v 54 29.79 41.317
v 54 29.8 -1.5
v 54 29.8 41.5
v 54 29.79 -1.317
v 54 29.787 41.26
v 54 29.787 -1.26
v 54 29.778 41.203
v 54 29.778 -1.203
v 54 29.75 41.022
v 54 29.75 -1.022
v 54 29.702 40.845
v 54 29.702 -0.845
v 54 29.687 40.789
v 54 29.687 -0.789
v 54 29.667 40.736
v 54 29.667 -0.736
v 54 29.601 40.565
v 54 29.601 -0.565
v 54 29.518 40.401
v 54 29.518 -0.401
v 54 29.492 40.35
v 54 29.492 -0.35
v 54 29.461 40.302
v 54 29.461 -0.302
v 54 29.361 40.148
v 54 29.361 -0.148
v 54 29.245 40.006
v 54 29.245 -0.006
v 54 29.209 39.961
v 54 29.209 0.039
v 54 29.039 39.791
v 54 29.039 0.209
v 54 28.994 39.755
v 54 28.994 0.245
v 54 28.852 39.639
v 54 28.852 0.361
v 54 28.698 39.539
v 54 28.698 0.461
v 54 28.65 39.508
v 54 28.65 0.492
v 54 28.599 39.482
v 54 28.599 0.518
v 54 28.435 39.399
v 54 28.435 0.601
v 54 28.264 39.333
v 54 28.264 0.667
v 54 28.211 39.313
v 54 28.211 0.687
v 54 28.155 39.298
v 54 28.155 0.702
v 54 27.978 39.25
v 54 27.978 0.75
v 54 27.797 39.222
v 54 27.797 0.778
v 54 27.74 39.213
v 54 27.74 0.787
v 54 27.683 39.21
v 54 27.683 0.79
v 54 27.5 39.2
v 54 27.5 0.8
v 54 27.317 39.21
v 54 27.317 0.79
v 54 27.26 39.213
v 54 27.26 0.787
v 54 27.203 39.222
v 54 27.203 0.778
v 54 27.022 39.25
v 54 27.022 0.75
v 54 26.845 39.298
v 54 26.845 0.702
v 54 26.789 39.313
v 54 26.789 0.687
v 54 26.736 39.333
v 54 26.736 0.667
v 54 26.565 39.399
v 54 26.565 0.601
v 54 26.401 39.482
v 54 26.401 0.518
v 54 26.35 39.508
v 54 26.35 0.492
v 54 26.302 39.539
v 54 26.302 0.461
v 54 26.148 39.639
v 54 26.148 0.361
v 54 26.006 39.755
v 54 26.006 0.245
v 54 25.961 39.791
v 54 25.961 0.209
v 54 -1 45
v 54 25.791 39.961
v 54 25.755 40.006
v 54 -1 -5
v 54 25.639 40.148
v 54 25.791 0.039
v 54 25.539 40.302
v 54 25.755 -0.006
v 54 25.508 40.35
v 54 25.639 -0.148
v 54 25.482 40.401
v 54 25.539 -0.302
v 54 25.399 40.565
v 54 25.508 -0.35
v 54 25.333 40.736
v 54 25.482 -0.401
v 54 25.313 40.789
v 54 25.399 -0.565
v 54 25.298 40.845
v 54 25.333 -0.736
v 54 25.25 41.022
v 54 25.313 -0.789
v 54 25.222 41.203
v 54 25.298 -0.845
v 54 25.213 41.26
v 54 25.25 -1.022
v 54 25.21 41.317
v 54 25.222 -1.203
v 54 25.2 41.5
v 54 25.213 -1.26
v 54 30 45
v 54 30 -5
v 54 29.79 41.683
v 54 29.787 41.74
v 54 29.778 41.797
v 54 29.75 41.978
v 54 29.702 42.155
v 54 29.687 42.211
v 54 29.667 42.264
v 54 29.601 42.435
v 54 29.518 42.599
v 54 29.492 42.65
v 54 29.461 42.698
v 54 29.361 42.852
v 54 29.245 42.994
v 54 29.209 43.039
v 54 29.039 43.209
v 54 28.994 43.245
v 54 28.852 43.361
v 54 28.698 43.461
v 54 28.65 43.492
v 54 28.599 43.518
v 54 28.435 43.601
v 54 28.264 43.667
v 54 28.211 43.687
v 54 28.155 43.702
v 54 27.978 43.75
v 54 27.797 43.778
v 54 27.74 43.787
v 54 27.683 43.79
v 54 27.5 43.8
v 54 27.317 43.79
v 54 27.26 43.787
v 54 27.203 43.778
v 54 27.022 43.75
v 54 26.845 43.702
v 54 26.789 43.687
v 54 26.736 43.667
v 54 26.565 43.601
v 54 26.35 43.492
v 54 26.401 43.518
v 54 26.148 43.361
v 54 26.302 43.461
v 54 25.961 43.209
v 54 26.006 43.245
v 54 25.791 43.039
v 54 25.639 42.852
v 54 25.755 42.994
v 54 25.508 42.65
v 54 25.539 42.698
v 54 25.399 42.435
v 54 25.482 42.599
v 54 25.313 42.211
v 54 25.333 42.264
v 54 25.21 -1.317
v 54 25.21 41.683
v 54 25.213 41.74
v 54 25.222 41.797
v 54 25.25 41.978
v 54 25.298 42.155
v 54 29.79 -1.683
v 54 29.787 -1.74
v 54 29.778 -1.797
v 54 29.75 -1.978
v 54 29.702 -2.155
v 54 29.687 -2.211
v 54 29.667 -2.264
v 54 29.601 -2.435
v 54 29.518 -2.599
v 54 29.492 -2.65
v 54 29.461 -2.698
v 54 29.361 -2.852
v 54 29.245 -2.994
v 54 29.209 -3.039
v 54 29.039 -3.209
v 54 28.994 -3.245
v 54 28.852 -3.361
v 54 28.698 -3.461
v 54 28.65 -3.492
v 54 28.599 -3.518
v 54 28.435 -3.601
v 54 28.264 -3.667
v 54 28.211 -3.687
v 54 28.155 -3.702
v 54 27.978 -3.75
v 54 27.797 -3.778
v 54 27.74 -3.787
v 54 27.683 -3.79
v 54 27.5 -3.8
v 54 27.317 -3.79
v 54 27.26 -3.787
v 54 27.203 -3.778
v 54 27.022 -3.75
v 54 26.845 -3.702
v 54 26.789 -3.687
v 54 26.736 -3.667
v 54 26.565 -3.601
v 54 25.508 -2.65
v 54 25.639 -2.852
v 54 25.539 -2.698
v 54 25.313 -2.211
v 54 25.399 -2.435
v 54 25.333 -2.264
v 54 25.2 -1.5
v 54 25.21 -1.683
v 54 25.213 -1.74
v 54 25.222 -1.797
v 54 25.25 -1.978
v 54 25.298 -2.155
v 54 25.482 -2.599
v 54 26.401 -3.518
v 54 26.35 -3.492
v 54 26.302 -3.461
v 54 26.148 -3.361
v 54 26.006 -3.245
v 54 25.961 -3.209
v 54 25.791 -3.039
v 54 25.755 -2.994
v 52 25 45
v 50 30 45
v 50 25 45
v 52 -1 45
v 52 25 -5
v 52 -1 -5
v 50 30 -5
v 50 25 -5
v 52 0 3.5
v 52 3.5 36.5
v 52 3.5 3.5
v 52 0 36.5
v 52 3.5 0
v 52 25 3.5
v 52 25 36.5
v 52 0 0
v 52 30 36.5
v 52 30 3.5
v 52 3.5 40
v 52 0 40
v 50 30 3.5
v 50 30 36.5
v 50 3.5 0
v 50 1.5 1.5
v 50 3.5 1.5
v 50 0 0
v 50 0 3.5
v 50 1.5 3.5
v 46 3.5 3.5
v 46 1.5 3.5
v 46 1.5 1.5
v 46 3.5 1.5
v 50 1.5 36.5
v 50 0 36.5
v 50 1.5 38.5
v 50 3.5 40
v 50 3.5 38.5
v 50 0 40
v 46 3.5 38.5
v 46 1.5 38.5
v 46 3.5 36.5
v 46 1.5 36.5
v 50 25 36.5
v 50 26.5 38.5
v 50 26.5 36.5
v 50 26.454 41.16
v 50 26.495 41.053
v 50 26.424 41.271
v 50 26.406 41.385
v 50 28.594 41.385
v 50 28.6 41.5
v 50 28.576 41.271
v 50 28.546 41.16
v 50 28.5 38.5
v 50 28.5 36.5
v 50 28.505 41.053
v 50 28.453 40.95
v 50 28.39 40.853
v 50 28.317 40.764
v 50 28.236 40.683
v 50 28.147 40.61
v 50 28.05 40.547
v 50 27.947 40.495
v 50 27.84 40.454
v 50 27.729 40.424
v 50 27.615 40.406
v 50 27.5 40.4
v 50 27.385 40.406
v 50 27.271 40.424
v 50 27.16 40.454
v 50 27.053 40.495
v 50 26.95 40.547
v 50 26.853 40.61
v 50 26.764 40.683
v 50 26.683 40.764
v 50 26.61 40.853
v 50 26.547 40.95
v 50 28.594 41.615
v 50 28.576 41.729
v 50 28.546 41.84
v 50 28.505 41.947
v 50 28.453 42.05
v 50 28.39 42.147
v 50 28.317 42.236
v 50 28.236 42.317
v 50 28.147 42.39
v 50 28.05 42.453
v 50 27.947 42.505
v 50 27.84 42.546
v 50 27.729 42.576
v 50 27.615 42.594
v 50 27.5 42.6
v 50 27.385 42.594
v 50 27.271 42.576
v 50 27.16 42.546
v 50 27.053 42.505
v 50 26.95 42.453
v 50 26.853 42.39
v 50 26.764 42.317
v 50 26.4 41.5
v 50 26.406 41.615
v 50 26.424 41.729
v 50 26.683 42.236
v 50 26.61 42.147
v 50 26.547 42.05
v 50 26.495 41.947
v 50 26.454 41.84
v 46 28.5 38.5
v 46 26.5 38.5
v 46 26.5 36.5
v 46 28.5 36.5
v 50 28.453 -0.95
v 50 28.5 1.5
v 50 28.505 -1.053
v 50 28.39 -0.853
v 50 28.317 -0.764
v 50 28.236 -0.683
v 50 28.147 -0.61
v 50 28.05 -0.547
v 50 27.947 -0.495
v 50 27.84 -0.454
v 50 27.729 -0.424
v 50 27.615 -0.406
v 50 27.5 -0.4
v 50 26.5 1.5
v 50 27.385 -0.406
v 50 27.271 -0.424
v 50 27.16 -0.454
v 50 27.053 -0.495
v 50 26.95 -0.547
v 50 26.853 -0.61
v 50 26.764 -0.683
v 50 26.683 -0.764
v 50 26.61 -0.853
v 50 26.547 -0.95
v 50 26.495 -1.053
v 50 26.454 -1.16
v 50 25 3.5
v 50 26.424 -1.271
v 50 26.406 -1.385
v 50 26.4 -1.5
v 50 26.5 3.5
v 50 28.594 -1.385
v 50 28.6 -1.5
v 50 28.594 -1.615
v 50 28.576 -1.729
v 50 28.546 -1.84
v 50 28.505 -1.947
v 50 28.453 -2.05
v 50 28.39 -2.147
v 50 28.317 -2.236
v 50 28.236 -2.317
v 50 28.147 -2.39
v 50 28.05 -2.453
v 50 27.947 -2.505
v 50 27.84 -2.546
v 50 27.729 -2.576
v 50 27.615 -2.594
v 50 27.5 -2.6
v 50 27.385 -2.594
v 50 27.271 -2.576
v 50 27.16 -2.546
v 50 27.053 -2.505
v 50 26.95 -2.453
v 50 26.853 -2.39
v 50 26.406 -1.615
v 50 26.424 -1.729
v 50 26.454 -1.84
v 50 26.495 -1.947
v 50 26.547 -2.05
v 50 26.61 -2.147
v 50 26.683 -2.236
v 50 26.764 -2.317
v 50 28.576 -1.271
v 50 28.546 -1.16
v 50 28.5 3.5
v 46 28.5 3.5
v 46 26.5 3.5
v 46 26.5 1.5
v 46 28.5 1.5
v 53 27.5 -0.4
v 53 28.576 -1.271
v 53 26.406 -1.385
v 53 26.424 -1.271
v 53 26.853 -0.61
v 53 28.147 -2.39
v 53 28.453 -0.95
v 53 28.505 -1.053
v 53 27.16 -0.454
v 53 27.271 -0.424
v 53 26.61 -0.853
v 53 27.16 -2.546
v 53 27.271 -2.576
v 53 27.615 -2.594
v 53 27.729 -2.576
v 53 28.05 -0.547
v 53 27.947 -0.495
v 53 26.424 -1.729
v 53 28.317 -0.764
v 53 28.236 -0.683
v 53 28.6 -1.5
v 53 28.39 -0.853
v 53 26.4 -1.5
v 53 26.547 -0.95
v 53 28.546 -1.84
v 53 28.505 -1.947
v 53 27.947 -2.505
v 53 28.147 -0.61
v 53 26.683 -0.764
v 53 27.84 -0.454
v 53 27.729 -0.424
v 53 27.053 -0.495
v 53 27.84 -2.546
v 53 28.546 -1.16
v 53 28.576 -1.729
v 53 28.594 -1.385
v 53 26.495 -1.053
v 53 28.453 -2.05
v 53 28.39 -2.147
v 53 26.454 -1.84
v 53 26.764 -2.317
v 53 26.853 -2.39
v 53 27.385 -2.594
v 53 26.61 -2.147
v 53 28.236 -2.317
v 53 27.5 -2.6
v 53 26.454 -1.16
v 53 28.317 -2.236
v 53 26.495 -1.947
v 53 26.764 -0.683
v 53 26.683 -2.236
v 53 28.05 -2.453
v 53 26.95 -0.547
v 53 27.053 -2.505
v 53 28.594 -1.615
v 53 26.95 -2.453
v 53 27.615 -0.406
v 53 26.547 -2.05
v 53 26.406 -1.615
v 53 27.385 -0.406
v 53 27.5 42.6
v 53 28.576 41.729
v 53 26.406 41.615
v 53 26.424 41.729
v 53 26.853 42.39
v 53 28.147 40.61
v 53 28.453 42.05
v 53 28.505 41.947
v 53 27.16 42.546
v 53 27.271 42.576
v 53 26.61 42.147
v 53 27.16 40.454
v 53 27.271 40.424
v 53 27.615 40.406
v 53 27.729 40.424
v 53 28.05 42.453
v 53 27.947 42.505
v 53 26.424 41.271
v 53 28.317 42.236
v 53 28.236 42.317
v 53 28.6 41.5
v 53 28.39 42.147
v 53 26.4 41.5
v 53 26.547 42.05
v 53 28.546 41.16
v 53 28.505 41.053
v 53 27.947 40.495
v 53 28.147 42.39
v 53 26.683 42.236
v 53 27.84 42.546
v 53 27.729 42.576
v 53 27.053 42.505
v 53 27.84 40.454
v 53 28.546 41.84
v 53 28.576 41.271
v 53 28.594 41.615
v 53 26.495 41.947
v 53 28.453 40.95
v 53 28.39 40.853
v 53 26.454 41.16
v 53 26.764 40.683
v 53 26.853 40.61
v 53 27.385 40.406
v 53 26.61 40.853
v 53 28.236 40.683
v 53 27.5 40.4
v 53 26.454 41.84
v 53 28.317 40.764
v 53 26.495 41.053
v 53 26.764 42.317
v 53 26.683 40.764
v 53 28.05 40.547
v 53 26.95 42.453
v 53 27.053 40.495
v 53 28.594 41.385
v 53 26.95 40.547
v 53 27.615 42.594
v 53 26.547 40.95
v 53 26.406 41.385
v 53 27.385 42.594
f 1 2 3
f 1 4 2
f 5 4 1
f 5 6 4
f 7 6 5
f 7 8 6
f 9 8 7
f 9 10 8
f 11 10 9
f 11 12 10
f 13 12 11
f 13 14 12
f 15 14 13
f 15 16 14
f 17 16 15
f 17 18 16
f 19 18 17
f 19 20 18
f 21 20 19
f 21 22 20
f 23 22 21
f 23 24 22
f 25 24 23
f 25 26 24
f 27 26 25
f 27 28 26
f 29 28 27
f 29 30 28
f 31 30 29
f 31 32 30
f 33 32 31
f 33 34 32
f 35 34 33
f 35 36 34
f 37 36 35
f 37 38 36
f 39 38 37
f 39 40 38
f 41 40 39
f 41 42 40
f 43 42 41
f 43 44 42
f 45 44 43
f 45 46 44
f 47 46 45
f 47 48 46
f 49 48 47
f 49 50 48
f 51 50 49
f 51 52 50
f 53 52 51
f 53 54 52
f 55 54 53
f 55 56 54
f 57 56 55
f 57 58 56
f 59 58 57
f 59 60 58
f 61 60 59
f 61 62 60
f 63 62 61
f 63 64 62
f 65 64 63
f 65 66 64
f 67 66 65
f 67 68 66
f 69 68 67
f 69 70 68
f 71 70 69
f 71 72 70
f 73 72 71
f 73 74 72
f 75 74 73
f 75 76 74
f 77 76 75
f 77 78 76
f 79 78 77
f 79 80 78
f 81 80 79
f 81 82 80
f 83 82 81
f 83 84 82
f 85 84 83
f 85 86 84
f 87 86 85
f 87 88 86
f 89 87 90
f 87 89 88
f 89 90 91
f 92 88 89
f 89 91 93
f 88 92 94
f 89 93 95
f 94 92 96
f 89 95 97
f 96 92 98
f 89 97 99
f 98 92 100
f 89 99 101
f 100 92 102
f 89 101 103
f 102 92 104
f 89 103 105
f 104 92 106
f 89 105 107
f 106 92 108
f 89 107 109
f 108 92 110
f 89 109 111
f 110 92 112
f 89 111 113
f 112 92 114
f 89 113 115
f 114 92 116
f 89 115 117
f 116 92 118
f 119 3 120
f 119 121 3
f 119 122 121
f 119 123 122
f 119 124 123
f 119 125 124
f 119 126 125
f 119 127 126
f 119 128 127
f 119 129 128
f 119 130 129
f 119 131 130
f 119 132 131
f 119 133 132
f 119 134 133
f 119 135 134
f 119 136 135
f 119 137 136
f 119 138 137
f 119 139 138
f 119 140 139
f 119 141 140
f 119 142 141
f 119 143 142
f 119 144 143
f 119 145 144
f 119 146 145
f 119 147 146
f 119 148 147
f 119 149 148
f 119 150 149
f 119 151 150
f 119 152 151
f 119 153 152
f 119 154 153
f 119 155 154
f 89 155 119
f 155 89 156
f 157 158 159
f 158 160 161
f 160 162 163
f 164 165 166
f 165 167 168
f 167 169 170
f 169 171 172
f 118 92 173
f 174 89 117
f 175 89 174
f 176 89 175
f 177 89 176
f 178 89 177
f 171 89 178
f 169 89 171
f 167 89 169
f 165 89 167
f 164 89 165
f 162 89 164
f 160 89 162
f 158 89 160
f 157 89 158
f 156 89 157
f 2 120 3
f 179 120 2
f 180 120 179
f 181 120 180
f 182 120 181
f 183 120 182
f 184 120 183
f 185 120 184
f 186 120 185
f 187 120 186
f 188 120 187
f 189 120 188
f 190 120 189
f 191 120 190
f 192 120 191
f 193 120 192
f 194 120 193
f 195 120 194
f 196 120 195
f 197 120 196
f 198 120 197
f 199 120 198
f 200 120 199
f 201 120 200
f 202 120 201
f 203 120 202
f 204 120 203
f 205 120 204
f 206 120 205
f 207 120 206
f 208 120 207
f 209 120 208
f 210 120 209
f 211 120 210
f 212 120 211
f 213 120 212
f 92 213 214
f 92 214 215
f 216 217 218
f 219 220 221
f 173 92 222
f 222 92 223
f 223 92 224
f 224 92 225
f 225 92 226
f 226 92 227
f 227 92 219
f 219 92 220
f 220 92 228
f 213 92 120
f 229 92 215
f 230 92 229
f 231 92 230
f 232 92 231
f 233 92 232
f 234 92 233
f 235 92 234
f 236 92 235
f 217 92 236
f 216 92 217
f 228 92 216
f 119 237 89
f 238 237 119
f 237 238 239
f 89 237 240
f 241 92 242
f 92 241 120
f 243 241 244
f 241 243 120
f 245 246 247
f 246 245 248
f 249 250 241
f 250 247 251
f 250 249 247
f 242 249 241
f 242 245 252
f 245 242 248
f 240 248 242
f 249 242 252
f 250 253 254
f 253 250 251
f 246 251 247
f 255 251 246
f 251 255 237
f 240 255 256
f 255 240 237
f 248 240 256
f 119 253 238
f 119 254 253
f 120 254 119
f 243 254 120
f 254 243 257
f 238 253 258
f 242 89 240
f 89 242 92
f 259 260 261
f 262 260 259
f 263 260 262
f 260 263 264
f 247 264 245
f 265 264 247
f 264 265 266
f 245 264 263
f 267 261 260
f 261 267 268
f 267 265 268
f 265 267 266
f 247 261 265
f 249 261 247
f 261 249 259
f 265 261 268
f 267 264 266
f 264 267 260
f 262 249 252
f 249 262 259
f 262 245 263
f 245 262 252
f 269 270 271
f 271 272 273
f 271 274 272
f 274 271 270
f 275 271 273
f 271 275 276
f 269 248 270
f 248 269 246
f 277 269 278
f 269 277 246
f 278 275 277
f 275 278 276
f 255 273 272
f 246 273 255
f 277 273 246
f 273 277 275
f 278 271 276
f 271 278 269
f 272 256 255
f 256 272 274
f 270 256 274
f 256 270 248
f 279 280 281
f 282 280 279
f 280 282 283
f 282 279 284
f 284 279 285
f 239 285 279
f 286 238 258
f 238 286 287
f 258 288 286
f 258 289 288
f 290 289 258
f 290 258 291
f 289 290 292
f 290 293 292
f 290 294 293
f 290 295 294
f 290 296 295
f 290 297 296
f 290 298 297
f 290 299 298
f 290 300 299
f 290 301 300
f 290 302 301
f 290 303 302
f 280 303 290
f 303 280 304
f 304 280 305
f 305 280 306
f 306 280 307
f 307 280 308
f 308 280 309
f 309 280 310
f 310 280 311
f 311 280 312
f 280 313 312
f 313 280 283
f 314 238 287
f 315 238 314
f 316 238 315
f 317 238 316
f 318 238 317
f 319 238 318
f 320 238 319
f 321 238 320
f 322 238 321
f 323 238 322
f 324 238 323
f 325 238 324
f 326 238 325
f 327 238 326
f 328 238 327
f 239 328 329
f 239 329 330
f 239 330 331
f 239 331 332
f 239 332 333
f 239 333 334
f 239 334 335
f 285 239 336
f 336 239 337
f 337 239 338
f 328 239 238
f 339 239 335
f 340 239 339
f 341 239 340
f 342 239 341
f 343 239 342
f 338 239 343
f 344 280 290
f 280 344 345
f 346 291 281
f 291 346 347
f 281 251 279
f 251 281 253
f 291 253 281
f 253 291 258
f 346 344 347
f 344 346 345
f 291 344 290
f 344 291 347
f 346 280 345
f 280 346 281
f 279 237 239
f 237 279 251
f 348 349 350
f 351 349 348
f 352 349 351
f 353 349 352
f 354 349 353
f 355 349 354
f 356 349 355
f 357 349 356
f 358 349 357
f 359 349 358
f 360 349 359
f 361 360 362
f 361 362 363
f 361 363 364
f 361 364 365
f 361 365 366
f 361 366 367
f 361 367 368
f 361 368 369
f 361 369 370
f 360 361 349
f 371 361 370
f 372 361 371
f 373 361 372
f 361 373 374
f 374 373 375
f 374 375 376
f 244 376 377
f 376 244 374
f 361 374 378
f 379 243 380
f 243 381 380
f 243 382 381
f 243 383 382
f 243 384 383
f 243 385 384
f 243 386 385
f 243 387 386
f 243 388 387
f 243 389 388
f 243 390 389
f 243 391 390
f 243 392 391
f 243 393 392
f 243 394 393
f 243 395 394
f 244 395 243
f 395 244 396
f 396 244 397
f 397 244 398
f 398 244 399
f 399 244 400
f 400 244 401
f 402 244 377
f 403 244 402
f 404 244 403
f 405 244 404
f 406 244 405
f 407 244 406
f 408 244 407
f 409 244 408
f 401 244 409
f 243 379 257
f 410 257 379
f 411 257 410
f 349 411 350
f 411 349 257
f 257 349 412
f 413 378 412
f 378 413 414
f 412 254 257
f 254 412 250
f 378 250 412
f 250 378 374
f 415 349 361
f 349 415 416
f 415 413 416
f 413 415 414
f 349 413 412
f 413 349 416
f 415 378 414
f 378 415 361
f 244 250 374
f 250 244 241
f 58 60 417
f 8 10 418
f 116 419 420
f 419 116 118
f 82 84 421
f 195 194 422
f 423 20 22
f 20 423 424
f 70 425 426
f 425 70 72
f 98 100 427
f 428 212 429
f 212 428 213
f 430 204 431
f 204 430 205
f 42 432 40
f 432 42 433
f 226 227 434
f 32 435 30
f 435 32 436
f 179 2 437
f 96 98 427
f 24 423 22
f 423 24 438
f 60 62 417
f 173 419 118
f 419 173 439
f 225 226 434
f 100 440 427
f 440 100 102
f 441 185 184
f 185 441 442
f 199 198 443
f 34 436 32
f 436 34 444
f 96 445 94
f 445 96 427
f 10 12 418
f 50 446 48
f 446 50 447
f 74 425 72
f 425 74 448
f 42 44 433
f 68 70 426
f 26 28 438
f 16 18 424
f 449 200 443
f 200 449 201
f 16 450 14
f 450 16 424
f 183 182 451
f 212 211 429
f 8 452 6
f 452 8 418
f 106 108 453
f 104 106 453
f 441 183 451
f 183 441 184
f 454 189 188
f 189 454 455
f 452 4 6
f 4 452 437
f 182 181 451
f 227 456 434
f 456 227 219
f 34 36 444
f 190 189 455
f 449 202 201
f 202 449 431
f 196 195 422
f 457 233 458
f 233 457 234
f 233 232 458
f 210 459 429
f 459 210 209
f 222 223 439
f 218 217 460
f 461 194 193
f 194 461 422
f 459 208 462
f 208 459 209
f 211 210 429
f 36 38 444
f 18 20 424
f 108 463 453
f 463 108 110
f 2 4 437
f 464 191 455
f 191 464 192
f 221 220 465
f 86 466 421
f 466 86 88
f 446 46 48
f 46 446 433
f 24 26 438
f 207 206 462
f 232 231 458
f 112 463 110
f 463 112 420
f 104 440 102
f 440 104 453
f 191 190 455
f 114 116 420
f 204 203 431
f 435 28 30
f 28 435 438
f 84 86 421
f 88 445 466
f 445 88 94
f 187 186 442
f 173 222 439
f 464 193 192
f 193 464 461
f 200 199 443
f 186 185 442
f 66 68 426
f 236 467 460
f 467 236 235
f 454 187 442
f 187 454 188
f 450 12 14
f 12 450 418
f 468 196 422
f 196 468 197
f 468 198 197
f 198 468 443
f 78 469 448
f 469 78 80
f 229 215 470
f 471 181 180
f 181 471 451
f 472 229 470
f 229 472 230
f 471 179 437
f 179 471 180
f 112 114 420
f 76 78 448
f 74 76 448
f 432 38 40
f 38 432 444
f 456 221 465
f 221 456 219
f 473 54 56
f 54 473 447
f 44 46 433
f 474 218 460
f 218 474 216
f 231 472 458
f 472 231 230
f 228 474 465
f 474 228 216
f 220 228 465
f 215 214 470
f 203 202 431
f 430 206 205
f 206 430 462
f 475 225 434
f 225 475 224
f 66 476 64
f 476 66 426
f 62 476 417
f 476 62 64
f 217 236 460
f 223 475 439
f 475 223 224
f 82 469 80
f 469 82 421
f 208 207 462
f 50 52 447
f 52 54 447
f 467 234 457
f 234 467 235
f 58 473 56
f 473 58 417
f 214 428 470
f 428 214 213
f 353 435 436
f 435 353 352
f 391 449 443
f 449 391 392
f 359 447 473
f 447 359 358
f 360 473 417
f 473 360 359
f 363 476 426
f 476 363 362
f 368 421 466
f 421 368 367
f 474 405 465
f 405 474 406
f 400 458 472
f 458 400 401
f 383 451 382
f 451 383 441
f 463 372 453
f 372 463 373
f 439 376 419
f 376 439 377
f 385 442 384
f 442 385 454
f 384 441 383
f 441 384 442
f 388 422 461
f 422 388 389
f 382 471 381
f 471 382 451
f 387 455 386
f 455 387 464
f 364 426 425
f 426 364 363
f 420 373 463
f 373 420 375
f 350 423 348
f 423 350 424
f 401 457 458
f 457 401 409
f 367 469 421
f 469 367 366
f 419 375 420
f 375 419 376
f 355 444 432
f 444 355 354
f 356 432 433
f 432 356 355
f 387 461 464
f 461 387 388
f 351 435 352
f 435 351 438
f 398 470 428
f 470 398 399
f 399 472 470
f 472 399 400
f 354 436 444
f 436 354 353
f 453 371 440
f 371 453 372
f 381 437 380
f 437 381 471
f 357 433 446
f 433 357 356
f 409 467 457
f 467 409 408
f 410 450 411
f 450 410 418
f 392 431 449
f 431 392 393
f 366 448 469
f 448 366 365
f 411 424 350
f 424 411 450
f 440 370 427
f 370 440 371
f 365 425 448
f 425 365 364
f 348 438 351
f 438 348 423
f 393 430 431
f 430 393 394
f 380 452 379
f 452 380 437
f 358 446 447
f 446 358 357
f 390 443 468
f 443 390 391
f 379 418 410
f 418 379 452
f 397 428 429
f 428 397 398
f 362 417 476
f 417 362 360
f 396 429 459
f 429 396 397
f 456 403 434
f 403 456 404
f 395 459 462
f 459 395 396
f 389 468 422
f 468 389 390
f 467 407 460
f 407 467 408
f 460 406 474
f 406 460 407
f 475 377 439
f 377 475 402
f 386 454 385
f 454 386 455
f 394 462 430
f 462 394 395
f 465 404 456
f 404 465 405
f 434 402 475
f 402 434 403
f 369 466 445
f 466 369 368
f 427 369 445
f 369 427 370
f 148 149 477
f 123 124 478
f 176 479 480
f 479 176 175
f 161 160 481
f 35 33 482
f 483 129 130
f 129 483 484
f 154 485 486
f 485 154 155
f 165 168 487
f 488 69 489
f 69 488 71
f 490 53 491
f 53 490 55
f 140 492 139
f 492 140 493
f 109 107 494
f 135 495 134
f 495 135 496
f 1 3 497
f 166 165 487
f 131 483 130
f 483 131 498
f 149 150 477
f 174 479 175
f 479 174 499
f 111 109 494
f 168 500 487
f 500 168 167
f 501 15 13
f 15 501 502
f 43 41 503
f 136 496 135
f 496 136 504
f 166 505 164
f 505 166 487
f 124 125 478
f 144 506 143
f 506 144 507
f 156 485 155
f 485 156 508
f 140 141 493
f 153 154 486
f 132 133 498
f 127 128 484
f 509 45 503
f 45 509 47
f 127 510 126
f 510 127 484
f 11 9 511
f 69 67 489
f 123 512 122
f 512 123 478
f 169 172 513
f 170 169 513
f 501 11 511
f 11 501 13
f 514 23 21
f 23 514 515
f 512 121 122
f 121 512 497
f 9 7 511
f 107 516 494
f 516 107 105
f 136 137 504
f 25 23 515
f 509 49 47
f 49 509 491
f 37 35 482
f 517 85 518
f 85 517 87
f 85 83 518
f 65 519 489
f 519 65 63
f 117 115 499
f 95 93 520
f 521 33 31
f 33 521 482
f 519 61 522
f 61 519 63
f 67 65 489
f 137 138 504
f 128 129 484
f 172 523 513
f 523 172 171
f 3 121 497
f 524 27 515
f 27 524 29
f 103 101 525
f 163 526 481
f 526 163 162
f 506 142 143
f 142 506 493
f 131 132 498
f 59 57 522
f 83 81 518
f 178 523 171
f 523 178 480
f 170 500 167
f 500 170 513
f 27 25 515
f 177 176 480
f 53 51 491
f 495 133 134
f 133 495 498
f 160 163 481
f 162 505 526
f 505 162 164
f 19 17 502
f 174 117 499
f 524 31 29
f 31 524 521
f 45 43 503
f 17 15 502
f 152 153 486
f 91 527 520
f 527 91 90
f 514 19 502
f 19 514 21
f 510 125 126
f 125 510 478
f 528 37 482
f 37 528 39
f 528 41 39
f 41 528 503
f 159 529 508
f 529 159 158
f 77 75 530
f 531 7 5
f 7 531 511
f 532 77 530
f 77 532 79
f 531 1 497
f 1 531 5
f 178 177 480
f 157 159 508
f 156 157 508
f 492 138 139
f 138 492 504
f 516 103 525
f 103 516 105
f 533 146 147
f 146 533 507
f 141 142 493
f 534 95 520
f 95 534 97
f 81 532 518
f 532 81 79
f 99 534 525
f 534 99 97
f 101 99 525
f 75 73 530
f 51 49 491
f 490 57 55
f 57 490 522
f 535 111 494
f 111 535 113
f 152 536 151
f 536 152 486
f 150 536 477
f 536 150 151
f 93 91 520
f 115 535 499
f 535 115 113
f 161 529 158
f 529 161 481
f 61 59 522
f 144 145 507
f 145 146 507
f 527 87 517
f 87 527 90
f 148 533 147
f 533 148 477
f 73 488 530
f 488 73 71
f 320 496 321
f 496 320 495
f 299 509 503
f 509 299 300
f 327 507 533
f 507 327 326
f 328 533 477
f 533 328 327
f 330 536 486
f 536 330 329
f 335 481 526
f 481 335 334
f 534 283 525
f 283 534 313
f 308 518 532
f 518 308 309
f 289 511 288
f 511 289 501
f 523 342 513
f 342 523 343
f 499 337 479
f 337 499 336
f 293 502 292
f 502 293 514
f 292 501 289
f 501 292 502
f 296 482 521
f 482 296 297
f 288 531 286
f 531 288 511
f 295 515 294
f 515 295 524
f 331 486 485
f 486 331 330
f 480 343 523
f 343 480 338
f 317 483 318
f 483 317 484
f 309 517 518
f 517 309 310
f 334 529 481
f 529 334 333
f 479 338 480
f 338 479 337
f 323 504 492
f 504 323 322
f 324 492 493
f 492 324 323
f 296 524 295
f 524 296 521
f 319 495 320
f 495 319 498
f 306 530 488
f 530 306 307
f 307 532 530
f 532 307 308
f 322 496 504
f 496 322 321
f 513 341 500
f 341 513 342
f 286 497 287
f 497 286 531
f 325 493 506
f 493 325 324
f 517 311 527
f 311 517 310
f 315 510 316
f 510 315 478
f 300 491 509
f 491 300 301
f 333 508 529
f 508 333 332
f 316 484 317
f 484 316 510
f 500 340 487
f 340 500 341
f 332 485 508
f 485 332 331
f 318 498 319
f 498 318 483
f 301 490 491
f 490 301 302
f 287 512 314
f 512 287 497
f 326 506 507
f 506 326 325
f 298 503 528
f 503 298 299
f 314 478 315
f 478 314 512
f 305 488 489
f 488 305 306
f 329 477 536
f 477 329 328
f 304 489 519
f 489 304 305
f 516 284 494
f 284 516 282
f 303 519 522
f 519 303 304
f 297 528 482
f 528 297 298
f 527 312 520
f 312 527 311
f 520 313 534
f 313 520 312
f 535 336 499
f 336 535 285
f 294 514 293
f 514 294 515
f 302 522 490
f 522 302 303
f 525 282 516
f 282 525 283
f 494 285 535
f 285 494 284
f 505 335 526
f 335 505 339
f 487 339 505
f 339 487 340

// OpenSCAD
// file: lib/objLib.scad
module screwHole(length)
{

cylinder(h=2,r1=3.5,r2=1.1) ;
cylinder(h=length,r=1.1);
    
}


module screwingHole(length)
{

cylinder(h=length,r=1);
    
}

//$fn=30;
screwHole(10);
// main file
use <lib/objLib.scad>

$fn=60;


group(){
    difference(){
        group(){ //couvercle 
            translate([52,-1,-5]) cube([2,31,50]);
            
            translate([46,1.5,1.5]) cube([4,2,2]);
            translate([50,0,0]) cube([2,3.5,3.5]);
            
            translate([46,1.5,36.5]) cube([4,2,2]);
            translate([50,0,36.5]) cube([2,3.5,3.5]);
            
            translate([46,26.5,36.5]) cube([4,2,2]);
            translate([50,25,36.5]) cube([2,5,8.5]);
            
            translate([46,26.5,1.5]) cube([4,2,2]);
            translate([50,25,-5]) cube([2,5,8.5]);    
            
        }
        translate([55,27.5,-1.5])rotate([0,-90,0])screwHole(6);
        translate([55,27.5,41.5])rotate([0,-90,0])screwHole(6);
    }
}


*group(){ //box
    difference(){
        group(){
            cube ([50,30,40]);
            difference(){
                group(){ // protection prise
                    translate([25,25,-3])cylinder(h=3,r=5);
                    translate([14,28.5,-3]) cube([10,1.5,3]);
                    translate([14,20,-3]) cube([10,1.5,3]);            
                }
                translate([18-((sqrt(2)*10)/2),17,-(sqrt(2)*10)/2])rotate([0,45,0])cube([10,15,10]); 
                translate([8,17,-4]) cube([10,15,4]);            
            }
        }
        translate([2,1.5,1.5]) cube([50,27,37]);
        translate([-1,25,3]) cube([5,1,33]);
        translate([-1,22,3]) cube([5,1,33]);
        translate([-1,19,3]) cube([5,1,33]);
        translate([-1,16,3]) cube([5,1,33]);
        translate([-1,13,3]) cube([5,1,33]);
        translate([-1,10,3]) cube([5,1,33]);
        translate([-1,7,3]) cube([5,1,33]);
        translate([-1,2.8,3]) cube([5,1,33]);
        
        //trou prise
        translate([18,21.5,-5]) cube([7,7,10]);
        translate([18,25,-5])cylinder(h=10,r=3.5);
        translate([25,25,-5.5])cylinder(h=10,r=3.5);


        
    }
    translate([2,5.5,10])rotate([0,90,0])cylinder(h=10,r1=1.6,r2=1);
    translate([2,5.5,20])rotate([0,90,0])cylinder(h=10,r1=1.6,r2=1);

    difference(){ //cal haut Wemos
        translate([10,25,33.5]) cube([27,4,5]); 
        translate([35,28-sqrt(2)*15,2])rotate([0,0,45])cube([15,15,27]); 
    }
    translate([10,20,35.5]) cube([27,2,3]); 


    difference(){ //cal bas Wemos
        translate([1.5,18,2]) cube([8,11,37]); 
        translate([8,22,2]) cube([5,3,37]); 
        translate([0,28-sqrt(2)*15,2])rotate([0,0,45])cube([15,15,37]); 
        translate([8,18,2]) cube([4,2,37]); 
    }
    difference(){ // support prise
        group(){
            translate([45,30,-5])rotate([90,0,0])cylinder(h=5,r=5);
            translate([33,25,-8]) cube([15,5,8]);         
            translate([45,25,-5]) cube([5,5,5]); 
        }
        translate([45,31,-5])rotate([90,0,0])cylinder(h=7,r=2);
        translate([33,23,0])rotate([0,135,0])cube([10,10,20]); 
        translate([51,27.5,-1.5])rotate([0,-90,0])screwingHole(10);
    }

    difference(){ // support oppposé prise
        group(){
            translate([45,30,45])rotate([90,0,0])cylinder(h=5,r=5);
            translate([33,25,40]) cube([15,5,8]);         
            translate([45,25,40]) cube([5,5,5]); 
        }
        translate([45,31,45])rotate([90,0,0])cylinder(h=7,r=2);
        translate([33-sqrt(2)*10,23,40])rotate([0,45,0])cube([10,10,30]); 
        translate([51,27.5,41.5])rotate([0,-90,0])screwingHole(10);
        
        
    }

    
}
